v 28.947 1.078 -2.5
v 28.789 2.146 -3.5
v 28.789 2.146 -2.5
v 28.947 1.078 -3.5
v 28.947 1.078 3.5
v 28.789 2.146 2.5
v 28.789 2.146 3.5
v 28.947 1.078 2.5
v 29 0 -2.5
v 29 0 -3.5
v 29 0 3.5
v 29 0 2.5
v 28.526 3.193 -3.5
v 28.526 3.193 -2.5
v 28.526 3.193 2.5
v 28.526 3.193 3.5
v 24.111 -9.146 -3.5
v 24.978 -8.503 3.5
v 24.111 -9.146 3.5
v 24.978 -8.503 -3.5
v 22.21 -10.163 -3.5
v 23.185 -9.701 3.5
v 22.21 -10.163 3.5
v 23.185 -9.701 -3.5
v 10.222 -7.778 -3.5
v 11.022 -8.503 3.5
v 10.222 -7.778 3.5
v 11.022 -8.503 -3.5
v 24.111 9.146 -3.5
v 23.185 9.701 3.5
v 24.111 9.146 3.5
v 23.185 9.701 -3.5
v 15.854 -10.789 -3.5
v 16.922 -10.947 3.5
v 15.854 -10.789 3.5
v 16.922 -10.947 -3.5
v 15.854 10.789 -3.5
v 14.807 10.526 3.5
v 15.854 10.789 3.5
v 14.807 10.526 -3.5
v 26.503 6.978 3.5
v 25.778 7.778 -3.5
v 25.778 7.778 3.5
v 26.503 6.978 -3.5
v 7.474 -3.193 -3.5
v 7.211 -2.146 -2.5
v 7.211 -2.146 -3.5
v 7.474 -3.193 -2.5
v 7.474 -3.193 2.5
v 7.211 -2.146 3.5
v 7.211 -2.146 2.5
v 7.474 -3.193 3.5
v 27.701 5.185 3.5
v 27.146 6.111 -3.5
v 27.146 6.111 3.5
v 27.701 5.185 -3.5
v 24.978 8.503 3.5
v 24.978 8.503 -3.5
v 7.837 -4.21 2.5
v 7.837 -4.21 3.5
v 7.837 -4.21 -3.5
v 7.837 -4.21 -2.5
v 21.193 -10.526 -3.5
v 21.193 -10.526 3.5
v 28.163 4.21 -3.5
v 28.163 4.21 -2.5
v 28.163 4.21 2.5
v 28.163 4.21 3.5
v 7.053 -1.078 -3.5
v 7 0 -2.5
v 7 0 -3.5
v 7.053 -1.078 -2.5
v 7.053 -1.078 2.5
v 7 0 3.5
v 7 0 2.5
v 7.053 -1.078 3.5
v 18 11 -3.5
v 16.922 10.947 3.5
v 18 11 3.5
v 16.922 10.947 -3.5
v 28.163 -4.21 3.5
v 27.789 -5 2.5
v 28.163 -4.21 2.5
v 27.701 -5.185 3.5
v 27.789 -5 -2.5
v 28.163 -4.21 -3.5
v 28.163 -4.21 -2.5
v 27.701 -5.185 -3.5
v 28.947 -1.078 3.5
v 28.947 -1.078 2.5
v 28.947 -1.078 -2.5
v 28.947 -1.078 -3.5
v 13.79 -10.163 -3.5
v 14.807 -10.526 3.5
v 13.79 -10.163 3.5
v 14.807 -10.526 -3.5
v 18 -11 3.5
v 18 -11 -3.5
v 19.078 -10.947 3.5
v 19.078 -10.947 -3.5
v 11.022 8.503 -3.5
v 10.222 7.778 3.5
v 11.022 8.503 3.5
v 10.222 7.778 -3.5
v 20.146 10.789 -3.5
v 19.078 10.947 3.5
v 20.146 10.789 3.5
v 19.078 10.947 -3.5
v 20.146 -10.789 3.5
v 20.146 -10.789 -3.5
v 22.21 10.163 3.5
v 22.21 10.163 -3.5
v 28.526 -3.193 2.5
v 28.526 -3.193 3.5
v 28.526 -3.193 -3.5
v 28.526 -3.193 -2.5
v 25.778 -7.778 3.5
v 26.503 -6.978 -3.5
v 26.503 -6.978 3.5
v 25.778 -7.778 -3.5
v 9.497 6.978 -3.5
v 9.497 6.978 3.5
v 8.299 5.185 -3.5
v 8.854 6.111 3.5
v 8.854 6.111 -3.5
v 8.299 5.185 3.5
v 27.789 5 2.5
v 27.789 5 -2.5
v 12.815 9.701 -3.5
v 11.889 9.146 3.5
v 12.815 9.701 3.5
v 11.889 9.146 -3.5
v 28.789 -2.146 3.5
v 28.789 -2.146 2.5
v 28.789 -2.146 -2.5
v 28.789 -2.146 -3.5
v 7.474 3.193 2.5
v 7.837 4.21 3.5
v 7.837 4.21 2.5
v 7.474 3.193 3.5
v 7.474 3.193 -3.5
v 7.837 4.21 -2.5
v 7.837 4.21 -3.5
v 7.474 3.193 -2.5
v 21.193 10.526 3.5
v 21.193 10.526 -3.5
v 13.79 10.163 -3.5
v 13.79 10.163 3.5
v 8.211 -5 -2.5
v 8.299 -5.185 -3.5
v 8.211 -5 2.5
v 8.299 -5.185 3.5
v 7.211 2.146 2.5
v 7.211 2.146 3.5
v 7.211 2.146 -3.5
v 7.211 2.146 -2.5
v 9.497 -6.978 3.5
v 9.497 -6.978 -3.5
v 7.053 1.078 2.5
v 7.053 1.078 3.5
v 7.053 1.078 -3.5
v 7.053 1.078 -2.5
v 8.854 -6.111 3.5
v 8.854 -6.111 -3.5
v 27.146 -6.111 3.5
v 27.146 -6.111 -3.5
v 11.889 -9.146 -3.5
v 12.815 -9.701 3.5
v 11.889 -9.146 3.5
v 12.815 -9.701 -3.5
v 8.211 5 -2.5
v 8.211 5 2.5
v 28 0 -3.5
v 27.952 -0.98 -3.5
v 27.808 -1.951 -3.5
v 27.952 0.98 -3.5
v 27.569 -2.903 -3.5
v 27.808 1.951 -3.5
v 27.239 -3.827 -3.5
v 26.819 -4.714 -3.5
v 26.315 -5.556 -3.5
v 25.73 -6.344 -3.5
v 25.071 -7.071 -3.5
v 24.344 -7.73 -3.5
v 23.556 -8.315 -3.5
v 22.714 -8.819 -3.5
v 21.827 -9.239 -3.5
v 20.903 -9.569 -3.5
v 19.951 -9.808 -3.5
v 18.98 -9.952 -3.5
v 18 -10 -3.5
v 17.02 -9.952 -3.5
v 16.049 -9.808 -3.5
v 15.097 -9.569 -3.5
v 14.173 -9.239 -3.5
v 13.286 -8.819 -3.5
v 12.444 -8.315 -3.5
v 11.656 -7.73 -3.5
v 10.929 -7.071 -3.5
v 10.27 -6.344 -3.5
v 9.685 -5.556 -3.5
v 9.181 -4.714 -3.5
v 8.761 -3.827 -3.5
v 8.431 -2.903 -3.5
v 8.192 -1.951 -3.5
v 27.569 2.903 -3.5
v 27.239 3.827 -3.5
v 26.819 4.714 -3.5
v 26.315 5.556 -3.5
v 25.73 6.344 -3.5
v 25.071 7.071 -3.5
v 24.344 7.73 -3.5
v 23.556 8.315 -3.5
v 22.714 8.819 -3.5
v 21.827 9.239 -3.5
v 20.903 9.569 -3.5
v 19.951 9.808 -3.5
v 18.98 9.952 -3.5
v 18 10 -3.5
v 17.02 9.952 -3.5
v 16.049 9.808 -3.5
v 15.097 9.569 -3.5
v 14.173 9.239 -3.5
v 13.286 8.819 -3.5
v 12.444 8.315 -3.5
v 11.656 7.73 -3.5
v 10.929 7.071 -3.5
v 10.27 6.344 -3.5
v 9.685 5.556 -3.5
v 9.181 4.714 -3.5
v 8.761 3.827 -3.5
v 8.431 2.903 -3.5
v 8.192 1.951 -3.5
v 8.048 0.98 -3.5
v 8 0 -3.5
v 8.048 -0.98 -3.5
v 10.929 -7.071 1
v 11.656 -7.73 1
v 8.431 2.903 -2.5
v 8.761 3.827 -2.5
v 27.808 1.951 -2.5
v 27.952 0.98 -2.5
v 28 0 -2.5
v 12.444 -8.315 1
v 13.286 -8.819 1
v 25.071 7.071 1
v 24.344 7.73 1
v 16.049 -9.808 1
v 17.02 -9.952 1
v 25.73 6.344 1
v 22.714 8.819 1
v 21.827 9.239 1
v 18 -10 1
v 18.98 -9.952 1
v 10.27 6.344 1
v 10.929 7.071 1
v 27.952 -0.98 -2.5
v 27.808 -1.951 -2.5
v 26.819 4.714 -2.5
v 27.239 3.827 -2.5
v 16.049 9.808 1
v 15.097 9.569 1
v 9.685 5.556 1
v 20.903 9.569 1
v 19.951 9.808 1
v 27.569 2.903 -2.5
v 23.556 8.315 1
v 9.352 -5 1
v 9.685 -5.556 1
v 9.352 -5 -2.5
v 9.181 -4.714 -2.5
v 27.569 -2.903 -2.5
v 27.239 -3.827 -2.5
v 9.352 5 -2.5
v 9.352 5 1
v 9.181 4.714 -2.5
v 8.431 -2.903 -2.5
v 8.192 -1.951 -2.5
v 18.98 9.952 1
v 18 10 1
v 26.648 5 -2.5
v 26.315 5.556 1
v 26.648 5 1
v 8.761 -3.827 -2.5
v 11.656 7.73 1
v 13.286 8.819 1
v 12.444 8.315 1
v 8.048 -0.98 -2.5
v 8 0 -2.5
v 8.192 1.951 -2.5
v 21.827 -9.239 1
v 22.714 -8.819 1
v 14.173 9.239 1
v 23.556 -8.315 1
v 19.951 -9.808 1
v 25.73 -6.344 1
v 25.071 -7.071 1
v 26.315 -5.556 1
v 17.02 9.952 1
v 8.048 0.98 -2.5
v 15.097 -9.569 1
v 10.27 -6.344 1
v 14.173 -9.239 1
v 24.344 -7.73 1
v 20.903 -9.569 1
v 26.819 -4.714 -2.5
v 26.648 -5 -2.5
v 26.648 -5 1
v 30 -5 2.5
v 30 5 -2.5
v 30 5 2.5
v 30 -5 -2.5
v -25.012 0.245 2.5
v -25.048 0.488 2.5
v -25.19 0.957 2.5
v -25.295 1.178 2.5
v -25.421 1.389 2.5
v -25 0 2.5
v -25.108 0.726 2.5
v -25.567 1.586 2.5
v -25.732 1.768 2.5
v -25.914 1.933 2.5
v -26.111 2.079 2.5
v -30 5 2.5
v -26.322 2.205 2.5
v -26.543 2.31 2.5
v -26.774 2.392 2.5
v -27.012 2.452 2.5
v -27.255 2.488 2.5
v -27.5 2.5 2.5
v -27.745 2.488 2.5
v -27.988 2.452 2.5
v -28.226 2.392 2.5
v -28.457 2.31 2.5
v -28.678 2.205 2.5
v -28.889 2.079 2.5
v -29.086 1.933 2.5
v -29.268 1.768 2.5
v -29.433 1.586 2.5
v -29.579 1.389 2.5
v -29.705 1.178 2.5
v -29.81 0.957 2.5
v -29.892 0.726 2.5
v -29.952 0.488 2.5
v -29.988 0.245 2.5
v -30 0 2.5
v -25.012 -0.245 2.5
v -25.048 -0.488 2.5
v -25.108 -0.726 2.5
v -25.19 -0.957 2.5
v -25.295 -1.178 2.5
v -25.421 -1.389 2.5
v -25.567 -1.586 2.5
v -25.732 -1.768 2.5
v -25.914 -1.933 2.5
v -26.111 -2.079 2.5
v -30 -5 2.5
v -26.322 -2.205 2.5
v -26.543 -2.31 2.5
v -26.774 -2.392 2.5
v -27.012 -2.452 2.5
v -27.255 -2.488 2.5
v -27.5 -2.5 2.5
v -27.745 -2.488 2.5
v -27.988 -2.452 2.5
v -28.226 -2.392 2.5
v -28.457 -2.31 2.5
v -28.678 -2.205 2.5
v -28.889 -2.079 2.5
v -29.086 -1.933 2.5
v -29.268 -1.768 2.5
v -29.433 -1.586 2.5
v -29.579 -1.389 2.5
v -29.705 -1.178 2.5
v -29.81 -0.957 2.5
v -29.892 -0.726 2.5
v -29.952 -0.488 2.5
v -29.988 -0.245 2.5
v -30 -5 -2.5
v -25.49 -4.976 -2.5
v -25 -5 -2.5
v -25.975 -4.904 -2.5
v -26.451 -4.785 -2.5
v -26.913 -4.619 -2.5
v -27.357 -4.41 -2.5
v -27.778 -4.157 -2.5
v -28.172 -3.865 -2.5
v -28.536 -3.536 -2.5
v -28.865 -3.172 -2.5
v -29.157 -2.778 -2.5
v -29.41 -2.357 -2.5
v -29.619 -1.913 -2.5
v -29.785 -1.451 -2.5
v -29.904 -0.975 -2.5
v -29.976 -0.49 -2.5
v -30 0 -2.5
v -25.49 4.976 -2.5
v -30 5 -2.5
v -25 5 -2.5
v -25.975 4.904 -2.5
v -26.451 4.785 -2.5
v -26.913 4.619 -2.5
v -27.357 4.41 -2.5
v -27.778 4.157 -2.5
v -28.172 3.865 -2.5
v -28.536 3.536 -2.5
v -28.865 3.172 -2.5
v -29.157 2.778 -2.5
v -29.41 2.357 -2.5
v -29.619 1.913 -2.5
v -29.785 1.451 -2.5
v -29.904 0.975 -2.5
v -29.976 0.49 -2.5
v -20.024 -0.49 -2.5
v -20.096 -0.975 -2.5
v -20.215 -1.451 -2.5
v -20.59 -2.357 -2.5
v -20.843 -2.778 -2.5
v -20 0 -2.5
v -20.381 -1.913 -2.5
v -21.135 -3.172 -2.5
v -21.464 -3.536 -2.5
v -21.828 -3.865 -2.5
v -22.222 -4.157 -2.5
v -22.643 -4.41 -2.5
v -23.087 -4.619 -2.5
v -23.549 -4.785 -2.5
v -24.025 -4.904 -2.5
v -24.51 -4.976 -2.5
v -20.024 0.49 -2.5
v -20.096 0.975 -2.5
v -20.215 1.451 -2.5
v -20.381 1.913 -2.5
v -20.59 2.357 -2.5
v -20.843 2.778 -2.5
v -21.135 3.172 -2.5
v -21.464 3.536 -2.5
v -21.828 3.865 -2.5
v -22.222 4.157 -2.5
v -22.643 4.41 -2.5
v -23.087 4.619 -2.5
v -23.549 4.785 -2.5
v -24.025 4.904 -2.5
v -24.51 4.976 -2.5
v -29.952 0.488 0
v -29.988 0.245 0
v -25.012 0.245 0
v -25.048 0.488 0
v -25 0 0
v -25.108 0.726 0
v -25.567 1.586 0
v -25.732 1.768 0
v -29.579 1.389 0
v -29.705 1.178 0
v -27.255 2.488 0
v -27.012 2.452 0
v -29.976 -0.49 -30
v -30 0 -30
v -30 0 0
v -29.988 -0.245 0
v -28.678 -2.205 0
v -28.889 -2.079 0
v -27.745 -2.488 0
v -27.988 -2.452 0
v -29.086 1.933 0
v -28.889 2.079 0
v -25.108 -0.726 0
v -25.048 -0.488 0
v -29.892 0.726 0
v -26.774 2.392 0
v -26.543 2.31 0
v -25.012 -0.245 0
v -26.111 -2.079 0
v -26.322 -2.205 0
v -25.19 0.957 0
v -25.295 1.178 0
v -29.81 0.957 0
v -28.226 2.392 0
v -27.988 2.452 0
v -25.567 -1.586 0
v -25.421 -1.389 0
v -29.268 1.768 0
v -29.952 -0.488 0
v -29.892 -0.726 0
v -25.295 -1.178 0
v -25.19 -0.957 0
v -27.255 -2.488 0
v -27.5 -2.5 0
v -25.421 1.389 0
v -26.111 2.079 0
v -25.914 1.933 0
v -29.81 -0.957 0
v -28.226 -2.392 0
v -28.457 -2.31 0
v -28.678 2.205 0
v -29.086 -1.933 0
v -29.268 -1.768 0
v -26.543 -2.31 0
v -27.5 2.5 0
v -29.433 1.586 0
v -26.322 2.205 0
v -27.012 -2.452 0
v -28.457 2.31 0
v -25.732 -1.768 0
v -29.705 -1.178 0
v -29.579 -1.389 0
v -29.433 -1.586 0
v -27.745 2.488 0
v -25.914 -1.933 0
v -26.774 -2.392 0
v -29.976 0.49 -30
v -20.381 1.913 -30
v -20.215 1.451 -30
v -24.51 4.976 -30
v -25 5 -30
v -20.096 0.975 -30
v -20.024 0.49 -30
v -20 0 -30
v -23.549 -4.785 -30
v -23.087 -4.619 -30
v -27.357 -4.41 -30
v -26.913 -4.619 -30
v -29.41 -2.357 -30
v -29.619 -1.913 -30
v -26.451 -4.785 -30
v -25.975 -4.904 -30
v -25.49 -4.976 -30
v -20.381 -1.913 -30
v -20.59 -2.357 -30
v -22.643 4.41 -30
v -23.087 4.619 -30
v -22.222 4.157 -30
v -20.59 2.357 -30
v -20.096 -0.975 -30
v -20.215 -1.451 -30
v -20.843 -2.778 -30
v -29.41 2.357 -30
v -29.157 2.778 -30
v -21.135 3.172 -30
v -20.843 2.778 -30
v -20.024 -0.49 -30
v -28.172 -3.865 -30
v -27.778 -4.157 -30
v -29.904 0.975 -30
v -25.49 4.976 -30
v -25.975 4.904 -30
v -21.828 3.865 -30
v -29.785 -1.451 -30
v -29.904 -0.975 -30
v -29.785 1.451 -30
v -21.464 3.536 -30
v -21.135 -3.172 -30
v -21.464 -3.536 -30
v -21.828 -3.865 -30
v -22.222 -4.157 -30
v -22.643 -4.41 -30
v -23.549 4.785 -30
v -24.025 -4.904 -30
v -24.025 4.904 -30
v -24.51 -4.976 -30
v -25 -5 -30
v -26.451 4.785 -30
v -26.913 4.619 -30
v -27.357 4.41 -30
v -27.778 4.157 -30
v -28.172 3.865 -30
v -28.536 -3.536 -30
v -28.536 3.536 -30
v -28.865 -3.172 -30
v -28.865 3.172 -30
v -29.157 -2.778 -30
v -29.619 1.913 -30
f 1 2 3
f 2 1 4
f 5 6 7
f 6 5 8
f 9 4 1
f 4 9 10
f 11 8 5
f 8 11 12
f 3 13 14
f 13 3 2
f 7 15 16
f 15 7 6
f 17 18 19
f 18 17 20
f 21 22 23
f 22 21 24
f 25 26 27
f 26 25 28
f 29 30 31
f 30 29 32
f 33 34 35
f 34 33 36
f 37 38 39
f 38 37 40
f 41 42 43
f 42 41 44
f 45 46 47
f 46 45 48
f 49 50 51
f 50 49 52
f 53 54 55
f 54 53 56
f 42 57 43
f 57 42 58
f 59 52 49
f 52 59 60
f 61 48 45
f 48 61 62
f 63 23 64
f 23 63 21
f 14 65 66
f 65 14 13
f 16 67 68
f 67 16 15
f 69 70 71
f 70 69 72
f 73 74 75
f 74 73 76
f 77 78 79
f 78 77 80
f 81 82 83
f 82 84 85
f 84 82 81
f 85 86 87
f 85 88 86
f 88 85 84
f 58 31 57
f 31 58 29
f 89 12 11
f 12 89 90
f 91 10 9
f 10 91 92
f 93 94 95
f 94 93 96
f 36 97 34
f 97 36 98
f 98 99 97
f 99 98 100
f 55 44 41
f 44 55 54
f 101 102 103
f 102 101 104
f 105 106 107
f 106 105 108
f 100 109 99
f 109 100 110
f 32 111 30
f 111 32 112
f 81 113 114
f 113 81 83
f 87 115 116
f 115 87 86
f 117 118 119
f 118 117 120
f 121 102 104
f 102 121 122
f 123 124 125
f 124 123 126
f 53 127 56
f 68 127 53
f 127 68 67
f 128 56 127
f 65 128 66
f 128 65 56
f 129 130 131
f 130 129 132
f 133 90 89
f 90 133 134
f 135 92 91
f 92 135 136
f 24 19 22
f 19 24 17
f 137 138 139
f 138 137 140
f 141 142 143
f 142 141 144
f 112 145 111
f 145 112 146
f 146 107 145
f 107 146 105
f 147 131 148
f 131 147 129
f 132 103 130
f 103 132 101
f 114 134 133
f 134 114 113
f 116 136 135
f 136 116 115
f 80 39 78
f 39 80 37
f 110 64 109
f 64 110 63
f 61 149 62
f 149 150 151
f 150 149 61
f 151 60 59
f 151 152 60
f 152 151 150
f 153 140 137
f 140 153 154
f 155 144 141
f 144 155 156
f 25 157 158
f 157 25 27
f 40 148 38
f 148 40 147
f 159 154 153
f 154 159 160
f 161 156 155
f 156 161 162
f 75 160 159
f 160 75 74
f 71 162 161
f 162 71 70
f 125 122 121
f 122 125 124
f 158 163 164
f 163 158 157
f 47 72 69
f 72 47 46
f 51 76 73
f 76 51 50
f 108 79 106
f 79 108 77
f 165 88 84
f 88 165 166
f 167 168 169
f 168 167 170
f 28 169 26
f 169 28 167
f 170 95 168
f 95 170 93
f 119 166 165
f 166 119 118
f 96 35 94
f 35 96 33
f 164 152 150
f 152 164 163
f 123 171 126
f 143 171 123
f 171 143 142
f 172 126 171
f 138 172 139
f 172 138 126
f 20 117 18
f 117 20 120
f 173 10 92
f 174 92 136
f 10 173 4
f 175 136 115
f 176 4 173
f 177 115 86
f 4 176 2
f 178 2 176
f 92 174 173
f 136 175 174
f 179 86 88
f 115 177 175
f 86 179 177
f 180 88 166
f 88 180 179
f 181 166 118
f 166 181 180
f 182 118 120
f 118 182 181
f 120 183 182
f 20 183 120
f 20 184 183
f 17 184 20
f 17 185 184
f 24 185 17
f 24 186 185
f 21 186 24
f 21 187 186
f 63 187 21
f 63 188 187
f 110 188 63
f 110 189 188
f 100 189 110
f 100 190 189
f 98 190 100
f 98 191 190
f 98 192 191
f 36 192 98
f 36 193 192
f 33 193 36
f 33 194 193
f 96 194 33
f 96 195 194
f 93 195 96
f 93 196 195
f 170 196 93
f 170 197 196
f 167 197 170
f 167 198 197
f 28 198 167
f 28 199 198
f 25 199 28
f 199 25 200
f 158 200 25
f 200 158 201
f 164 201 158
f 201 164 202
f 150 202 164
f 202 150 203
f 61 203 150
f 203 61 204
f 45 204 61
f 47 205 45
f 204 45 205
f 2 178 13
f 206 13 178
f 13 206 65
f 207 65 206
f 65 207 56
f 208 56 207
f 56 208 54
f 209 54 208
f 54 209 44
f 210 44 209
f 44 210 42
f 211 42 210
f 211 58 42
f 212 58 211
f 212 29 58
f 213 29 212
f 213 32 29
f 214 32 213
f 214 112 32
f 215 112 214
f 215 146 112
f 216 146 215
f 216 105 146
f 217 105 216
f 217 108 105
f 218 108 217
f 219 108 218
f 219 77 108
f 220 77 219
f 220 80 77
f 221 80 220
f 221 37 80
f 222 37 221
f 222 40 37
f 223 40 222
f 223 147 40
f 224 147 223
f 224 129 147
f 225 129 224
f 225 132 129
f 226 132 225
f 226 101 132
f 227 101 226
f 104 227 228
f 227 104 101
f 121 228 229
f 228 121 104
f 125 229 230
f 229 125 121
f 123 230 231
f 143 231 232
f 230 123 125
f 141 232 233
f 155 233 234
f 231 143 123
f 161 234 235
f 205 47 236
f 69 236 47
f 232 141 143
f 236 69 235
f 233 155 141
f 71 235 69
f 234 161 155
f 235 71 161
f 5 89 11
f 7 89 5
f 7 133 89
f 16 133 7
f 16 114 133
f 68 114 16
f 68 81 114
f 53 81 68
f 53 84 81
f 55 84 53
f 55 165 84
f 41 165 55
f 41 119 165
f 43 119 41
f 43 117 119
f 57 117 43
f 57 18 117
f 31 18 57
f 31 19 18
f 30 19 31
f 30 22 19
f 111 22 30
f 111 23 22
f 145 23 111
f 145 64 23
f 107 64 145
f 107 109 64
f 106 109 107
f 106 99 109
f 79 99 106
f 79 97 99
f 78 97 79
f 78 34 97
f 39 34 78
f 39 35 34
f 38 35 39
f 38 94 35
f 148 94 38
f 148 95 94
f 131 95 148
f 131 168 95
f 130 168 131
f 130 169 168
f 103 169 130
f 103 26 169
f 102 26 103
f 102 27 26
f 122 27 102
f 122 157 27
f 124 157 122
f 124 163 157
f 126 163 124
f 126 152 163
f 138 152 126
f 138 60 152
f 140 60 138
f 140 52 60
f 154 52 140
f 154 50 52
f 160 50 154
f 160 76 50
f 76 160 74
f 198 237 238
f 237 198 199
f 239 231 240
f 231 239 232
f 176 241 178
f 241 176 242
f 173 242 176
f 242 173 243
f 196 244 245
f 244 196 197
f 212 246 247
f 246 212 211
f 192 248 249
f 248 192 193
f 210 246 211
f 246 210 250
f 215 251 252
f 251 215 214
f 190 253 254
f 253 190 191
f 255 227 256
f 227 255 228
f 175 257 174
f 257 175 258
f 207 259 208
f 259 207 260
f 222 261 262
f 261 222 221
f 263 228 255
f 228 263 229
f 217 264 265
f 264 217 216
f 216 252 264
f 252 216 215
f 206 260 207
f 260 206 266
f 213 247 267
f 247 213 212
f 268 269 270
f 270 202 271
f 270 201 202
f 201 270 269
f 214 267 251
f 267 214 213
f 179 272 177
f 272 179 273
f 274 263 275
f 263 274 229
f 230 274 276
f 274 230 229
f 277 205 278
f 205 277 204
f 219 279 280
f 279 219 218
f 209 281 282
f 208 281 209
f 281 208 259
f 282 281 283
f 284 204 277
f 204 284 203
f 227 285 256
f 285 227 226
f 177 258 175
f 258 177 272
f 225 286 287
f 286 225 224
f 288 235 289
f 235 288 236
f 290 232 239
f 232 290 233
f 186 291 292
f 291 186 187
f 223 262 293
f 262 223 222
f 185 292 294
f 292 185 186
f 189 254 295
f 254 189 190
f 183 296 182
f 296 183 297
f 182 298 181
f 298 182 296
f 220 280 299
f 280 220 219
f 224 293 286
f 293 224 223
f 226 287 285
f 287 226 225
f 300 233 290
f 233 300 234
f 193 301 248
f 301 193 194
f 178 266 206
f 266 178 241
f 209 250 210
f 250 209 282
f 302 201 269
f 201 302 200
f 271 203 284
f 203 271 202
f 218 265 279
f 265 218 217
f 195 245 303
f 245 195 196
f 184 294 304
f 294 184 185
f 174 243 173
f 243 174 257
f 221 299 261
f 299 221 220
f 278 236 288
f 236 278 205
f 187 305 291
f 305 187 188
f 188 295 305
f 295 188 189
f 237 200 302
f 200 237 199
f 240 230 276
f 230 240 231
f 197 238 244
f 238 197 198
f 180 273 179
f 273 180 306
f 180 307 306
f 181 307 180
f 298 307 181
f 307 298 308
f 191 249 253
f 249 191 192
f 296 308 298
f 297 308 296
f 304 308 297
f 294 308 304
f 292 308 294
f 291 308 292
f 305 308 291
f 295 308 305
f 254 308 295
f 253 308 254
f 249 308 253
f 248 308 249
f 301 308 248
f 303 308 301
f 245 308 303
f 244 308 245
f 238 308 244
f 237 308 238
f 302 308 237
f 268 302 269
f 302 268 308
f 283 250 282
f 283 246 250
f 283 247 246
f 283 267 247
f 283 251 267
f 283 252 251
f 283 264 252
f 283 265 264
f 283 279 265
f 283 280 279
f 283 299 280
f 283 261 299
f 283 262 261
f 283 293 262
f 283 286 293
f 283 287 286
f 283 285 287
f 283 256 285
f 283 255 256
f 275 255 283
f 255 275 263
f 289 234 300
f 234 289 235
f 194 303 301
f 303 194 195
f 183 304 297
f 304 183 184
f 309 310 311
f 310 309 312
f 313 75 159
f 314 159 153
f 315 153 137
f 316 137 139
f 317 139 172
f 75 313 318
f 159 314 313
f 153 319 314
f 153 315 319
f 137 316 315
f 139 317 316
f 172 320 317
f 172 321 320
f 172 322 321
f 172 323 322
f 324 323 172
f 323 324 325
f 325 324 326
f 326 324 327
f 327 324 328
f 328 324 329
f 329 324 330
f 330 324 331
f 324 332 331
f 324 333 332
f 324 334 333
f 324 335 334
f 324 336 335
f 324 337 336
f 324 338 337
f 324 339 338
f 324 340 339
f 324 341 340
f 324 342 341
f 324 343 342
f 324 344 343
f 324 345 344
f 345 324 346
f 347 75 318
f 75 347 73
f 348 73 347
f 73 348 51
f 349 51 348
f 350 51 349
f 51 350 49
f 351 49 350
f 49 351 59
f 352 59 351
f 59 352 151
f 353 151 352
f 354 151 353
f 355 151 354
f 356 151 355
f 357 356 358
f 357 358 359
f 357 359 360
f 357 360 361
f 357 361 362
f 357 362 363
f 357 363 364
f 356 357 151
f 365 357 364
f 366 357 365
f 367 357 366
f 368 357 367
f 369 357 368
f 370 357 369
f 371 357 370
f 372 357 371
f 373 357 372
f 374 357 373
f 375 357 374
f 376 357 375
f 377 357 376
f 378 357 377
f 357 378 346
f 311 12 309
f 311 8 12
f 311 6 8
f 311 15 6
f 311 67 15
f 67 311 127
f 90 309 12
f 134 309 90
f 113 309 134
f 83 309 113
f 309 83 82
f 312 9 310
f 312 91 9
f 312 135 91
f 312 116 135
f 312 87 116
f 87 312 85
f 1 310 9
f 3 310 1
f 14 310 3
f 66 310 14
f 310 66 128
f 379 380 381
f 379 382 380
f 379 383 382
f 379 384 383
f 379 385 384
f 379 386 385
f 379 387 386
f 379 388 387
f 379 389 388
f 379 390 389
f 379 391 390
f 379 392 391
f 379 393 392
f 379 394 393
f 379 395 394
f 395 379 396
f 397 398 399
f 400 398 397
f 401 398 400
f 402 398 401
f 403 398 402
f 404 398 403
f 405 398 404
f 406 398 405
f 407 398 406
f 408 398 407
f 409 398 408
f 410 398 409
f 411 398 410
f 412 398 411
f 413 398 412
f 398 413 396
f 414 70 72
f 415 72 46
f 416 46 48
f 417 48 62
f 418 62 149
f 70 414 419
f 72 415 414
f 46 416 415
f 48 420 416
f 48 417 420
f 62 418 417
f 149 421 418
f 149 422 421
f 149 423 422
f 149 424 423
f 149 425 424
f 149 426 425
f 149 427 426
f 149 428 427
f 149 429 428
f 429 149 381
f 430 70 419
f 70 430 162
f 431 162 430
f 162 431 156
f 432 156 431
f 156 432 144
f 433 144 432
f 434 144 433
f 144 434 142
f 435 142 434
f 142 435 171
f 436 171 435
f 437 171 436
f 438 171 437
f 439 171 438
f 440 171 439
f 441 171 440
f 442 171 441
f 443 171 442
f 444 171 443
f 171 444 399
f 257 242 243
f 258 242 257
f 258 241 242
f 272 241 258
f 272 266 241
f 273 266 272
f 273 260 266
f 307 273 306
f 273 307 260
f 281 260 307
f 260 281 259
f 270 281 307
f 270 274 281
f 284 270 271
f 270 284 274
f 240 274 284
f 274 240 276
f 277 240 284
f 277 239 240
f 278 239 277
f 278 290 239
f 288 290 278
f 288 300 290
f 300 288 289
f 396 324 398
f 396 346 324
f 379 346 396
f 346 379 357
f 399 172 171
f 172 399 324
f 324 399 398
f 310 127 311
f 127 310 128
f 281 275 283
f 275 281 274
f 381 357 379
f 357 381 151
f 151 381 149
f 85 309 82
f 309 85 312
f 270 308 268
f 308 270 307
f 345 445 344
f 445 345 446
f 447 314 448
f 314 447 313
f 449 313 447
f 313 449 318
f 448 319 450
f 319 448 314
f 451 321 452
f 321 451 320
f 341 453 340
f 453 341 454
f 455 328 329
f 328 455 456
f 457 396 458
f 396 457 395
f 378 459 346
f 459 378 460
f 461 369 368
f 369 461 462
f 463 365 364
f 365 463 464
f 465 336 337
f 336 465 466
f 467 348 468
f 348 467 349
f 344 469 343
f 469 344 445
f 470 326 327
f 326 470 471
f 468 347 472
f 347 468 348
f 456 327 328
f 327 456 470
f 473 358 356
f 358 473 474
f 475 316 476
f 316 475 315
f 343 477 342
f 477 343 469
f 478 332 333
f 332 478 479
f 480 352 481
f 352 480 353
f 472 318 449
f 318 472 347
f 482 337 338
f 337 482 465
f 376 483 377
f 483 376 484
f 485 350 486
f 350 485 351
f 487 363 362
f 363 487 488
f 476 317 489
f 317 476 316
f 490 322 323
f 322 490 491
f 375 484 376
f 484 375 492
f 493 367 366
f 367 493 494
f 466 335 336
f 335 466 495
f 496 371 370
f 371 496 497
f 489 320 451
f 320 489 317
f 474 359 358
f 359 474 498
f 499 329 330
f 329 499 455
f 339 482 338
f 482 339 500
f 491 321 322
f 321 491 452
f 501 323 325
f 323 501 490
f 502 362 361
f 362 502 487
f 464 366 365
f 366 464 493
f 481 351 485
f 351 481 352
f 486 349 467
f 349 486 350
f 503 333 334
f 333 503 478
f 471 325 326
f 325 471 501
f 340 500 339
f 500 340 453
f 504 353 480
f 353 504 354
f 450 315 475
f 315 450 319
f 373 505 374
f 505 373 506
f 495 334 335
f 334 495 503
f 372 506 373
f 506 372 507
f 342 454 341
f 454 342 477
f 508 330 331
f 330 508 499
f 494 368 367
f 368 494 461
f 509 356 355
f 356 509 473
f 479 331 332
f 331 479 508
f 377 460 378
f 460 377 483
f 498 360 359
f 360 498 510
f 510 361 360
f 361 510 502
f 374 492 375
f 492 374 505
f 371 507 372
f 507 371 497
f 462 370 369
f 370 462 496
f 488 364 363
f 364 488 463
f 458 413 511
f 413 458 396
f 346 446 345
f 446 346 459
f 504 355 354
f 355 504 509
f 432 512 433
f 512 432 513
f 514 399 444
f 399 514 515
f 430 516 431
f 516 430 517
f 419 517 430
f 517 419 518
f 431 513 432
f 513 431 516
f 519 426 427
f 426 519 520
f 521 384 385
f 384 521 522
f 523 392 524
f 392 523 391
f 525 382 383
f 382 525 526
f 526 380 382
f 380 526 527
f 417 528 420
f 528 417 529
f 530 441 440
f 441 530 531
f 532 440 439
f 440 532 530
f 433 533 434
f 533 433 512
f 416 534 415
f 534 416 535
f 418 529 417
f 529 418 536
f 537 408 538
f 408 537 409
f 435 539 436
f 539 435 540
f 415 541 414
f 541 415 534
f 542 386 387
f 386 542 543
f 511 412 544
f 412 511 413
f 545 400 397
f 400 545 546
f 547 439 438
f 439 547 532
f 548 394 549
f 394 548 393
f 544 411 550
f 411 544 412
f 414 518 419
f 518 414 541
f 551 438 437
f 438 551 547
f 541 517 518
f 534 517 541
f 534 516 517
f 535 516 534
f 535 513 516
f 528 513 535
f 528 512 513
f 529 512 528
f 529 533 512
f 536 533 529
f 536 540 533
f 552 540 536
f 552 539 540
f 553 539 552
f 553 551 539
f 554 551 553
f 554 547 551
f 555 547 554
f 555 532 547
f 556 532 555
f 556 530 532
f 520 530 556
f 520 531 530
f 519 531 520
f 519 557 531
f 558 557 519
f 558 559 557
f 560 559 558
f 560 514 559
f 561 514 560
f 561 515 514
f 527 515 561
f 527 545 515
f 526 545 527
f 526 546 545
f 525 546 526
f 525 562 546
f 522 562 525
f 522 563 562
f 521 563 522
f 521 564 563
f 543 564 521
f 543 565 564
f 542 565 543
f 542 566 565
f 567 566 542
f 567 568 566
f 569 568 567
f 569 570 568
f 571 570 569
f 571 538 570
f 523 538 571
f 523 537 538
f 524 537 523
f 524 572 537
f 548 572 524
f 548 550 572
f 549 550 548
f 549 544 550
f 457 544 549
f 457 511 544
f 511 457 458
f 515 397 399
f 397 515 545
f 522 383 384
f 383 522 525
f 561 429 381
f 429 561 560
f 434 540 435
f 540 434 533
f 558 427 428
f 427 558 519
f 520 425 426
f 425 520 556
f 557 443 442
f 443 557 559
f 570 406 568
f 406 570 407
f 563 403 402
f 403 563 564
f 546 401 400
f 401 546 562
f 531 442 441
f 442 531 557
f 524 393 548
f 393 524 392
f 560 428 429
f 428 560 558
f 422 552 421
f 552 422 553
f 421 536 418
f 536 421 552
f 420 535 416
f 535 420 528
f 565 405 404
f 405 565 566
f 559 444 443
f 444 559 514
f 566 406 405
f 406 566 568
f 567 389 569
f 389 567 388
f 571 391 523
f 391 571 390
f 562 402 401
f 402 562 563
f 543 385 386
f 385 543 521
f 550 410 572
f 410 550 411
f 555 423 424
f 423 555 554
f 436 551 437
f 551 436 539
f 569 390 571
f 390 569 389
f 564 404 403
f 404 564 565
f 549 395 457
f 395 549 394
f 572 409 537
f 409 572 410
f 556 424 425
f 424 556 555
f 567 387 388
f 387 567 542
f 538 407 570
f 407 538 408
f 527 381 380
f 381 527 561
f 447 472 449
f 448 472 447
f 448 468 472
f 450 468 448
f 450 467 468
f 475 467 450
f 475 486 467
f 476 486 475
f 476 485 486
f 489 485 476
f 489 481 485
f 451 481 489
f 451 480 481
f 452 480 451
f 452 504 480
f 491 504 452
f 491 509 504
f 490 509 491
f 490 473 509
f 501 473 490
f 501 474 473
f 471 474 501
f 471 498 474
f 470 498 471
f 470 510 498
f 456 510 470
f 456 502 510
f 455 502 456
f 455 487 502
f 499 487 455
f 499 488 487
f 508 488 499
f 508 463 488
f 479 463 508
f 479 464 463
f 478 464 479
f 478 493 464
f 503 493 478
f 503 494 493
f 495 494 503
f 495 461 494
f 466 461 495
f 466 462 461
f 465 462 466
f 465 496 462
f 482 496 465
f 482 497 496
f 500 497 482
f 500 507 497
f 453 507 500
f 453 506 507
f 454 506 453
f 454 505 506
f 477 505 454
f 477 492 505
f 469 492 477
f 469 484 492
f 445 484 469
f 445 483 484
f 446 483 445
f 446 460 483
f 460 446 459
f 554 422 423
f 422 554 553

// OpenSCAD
$fn=64;

// Parameters
bearing_diameter = 22; // 608 bearing outer diameter
bearing_width = 7; // 608 bearing width
idler_diameter = 24; // Idler diameter for GT2 belt
idler_width = 8; // Idler width
arm_length = 60; // Length of the pivot arm
arm_width = 10; // Width of the pivot arm
arm_thickness = 5; // Thickness of the pivot arm
spring_diameter = 10; // Diameter of the spring
spring_length = 30; // Length of the spring
pivot_hole_diameter = 5; // Diameter of the pivot hole

// Idler with bearing
module idler_with_bearing() {
    difference() {
        cylinder(d=bearing_diameter, h=bearing_width, center=true);
        translate([0, 0, -bearing_width/2])
            cylinder(d=bearing_diameter - 2, h=bearing_width + 2, center=true);
    }
}

// Pivot arm
module pivot_arm() {
    difference() {
        cube([arm_length, arm_width, arm_thickness], center=true);
        translate([-arm_length/2 + pivot_hole_diameter/2, 0, 0])
            cylinder(d=pivot_hole_diameter, h=arm_thickness + 2, center=true);
    }
}

// Spring
module spring() {
    translate([0, 0, -spring_length/2])
        cylinder(d=spring_diameter, h=spring_length, center=true);
}

// Assembly
module belt_tensioner() {
    union() {
        // Idler
        translate([arm_length/2 - idler_diameter/2, 0, 0])
            idler_with_bearing();
        
        // Pivot arm
        pivot_arm();
        
        // Spring
        translate([-arm_length/2 + spring_diameter/2, 0, 0])
            spring();
    }
}

// Render the belt tensioner
belt_tensioner();
